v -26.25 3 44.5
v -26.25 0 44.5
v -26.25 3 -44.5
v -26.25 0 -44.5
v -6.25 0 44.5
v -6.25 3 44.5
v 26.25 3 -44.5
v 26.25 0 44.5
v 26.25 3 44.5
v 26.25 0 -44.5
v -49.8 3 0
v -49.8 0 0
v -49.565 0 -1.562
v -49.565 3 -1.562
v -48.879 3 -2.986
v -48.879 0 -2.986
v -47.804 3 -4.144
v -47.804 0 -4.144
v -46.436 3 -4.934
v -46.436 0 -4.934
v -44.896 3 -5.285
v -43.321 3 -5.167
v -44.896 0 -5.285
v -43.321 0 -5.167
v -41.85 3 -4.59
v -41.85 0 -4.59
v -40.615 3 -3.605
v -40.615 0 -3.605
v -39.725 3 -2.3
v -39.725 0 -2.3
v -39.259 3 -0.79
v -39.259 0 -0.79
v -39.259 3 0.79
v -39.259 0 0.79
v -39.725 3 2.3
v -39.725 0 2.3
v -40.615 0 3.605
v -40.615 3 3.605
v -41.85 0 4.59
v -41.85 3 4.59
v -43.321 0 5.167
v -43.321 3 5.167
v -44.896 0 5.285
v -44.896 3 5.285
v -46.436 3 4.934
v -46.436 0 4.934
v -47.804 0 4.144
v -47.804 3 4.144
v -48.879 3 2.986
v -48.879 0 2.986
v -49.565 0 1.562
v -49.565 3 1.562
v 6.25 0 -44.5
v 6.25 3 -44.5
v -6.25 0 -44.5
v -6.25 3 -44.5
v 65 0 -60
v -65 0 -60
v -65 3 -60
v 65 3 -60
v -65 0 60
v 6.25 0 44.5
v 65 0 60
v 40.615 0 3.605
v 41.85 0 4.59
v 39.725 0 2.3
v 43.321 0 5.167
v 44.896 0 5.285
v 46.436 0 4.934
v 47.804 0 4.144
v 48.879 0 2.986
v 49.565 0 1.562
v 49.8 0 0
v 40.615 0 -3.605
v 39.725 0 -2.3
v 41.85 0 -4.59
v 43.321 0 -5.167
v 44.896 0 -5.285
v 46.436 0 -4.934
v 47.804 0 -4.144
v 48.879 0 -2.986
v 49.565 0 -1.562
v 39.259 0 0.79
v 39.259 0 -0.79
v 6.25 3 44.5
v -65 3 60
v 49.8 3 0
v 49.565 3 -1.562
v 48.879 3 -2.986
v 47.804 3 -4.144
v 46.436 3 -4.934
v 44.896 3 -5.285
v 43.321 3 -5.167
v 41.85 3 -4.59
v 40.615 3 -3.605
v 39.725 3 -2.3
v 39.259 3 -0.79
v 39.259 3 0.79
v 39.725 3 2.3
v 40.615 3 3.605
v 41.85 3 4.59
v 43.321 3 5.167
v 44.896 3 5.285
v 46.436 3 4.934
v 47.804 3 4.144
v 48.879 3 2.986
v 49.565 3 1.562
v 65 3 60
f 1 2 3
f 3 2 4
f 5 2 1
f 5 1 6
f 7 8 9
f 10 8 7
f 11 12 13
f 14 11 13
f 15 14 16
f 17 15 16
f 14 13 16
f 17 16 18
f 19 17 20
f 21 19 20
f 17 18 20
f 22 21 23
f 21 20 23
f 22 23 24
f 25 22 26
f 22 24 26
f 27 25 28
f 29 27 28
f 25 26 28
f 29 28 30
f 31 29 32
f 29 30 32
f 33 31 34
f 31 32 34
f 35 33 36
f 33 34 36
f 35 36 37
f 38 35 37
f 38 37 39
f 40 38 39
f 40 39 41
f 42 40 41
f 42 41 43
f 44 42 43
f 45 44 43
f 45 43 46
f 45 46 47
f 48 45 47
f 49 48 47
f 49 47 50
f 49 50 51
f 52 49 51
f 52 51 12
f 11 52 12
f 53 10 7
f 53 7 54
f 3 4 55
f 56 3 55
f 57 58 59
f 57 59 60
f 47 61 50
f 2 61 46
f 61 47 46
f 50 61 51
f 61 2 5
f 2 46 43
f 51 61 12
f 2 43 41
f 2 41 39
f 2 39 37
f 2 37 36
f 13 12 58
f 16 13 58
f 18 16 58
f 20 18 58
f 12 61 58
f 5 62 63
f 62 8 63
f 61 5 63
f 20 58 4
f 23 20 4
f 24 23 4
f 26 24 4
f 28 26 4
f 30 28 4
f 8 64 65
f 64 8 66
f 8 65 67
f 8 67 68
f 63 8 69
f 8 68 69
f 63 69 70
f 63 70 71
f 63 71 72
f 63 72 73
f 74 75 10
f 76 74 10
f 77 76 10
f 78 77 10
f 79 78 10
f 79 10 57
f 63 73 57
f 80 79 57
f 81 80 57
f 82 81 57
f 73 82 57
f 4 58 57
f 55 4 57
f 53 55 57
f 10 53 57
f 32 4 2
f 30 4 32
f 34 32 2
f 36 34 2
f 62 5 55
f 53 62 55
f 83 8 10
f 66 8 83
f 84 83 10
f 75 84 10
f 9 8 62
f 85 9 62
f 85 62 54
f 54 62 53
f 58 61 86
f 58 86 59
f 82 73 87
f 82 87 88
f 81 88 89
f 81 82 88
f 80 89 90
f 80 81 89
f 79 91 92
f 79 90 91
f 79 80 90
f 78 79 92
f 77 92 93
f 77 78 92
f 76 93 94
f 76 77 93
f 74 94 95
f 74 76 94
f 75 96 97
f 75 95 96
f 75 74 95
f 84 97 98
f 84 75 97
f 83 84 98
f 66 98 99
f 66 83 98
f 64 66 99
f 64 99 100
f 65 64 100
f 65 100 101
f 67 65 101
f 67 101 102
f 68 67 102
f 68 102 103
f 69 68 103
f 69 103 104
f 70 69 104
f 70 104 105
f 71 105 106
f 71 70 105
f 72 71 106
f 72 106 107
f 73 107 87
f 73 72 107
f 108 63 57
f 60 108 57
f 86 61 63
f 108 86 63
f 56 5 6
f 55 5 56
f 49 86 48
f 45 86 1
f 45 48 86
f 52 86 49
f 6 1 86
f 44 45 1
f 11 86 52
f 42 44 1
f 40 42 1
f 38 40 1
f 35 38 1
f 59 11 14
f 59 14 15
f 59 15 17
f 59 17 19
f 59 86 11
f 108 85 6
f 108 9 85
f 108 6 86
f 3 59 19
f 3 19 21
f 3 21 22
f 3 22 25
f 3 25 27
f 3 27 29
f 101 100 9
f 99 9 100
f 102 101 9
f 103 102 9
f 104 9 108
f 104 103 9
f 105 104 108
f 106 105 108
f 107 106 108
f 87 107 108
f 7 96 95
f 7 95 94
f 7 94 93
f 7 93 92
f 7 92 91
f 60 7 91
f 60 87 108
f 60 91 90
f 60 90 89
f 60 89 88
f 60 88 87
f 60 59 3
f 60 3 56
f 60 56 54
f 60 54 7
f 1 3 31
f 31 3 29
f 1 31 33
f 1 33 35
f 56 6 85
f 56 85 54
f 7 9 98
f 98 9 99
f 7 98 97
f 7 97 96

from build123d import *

# Parameters (mm, degrees)
SKETCH1_W           = 130
SKETCH1_H           = 120
BOSS_EXTRUDE1_DEPTH = 3
CUT_EXTRUDE1_START  = -4
SKETCH2_W           = 20
SKETCH2_H           = 89
CUT_EXTRUDE1_DEPTH  = 5
CUT_EXTRUDE2_START  = -4
SKETCH3_R           = 5.3
CUT_EXTRUDE2_DEPTH  = 5


with BuildPart() as part:
    # Sketch1 → Boss-Extrude1 (new body)
    with BuildSketch(Plane(origin=(0, 0, 0), x_dir=(1, 0, 0), z_dir=(0, 1, 0))):
        Rectangle(SKETCH1_W, SKETCH1_H)
    extrude(amount=BOSS_EXTRUDE1_DEPTH)

    # Sketch2 → Cut-Extrude1 (cut)
    with BuildSketch(Plane(origin=(0, 3, 0), x_dir=(1, 0, 0), z_dir=(0, 1, 0)).offset(CUT_EXTRUDE1_START)):
        with Locations((-16.25, 0)):
            Rectangle(SKETCH2_W, SKETCH2_H)
    cut_extrude1 = extrude(amount=CUT_EXTRUDE1_DEPTH, mode=Mode.SUBTRACT)

    # Mirror1: Cut-Extrude1 across plane
    add(cut_extrude1.mirror(Plane(origin=(0, 0, 0), x_dir=(0, 0, 1), z_dir=(1, 0, 0))), mode=Mode.SUBTRACT)

    # Sketch3 → Cut-Extrude2 (cut)
    with BuildSketch(Plane(origin=(0, 3, 0), x_dir=(1, 0, 0), z_dir=(0, 1, 0)).offset(CUT_EXTRUDE2_START)):
        with Locations((44.5, 0)):
            Circle(SKETCH3_R)
    cut_extrude2 = extrude(amount=CUT_EXTRUDE2_DEPTH, mode=Mode.SUBTRACT)

    # Mirror2: Cut-Extrude2 across plane
    add(cut_extrude2.mirror(Plane(origin=(0, 0, 0), x_dir=(0, 0, 1), z_dir=(1, 0, 0))), mode=Mode.SUBTRACT)


solid = part.part
